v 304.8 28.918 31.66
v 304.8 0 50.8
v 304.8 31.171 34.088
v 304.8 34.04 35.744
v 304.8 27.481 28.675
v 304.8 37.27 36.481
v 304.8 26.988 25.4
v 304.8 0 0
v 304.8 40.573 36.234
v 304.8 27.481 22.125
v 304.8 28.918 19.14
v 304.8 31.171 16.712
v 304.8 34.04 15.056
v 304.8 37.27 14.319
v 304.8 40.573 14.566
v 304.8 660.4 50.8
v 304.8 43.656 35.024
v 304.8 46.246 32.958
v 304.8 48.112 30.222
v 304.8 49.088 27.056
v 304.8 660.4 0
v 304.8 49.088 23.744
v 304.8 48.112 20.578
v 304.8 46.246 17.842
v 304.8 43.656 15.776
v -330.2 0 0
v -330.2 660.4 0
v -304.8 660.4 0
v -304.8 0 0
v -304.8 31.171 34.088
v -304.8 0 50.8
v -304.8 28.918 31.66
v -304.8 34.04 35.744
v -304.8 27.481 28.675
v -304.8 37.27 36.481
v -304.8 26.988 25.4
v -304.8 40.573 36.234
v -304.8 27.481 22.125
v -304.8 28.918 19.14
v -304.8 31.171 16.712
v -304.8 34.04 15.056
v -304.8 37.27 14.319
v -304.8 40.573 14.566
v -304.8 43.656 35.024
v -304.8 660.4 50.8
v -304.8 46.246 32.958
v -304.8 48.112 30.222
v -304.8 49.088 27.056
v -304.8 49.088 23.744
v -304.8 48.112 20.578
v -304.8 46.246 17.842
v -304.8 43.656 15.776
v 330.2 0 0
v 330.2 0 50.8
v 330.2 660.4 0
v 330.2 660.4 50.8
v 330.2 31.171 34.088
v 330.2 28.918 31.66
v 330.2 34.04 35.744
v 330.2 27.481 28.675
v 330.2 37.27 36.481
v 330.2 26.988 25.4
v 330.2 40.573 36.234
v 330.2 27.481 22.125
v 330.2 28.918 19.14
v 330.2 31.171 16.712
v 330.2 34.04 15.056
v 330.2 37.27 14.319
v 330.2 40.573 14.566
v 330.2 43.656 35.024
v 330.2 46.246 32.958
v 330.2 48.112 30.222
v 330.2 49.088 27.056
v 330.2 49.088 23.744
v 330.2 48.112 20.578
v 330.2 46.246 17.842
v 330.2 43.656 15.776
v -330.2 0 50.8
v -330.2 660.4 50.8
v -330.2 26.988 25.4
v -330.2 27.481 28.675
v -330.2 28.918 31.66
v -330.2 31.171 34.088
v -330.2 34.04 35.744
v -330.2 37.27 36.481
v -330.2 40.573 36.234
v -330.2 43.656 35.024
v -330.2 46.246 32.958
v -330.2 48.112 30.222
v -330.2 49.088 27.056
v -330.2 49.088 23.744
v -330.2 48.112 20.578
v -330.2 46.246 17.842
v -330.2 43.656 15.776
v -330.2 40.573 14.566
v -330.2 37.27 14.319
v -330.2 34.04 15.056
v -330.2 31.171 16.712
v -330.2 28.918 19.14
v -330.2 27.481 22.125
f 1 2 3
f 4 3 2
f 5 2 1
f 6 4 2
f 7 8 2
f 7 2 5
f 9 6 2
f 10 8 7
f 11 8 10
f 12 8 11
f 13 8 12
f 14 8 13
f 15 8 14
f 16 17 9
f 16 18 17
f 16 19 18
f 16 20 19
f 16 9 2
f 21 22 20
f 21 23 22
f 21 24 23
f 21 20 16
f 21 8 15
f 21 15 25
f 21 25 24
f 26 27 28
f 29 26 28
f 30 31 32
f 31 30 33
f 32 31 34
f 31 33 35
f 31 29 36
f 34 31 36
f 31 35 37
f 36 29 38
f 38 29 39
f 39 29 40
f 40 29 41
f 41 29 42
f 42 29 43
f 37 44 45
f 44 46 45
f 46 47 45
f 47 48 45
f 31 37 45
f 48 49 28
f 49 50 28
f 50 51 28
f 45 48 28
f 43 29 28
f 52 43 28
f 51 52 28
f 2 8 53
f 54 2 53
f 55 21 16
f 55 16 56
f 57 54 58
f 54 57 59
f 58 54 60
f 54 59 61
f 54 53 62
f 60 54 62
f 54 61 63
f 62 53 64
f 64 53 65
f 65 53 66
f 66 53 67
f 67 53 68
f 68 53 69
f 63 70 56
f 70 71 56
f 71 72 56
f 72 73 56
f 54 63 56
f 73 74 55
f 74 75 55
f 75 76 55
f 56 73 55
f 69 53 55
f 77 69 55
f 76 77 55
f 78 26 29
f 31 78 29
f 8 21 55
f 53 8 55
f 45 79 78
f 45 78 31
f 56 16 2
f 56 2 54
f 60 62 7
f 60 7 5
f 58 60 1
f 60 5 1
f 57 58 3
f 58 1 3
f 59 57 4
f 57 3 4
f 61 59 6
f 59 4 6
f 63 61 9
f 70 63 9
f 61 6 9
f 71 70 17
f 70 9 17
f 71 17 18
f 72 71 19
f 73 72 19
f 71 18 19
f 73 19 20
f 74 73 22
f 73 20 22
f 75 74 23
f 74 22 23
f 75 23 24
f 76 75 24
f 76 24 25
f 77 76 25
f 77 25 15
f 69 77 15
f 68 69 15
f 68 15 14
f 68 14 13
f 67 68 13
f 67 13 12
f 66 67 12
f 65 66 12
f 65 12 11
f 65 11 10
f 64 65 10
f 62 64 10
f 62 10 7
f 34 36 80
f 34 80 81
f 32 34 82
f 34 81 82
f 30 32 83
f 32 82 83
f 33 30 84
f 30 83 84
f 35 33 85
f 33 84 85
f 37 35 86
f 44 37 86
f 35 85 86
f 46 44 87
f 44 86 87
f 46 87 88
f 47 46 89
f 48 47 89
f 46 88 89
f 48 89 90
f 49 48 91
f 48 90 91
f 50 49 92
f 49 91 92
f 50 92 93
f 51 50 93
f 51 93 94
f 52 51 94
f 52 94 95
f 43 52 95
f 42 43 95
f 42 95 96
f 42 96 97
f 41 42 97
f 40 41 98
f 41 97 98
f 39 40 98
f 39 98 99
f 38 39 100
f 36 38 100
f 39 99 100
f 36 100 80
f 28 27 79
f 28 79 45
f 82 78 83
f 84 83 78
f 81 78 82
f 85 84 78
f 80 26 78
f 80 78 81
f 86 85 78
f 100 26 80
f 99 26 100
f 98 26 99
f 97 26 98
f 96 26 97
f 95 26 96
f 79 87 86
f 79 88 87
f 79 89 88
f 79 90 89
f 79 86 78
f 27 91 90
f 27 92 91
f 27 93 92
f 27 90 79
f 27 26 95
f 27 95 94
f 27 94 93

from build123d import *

# Parameters (mm, degrees)
F0_W     = 25.4
F0_H     = 660.4
F1_DEPTH = 50.8
F2_R     = 11.1125
F3_DEPTH = 25.401
F4_R     = 11.1125
F5_DEPTH = 660.401


with BuildPart() as f1:
    # F0 (on Top) → F1 (new body)
    with BuildSketch(Plane.XY):
        with Locations((-317.5, 330.2)):
            Rectangle(F0_W, F0_H)
        with Locations((317.5, 330.2)):
            Rectangle(F0_W, F0_H)
    extrude(amount=F1_DEPTH)

    # F2 (on face) → F3 (cut, through all)
    with BuildSketch(Plane(origin=(304.8, 0, 0), x_dir=(0, -1, 0), z_dir=(-1, 0, 0))):
        with Locations((-38.1, 25.4)):
            Circle(F2_R)
    extrude(amount=-F3_DEPTH, mode=Mode.SUBTRACT)

    # F4 (on face) → F5 (cut, through all)
    with BuildSketch(Plane(origin=(-330.2, 0, 0), x_dir=(0, -1, 0), z_dir=(-1, 0, 0))):
        with Locations((-38.1, 25.4)):
            Circle(F4_R)
    extrude(amount=-F5_DEPTH, mode=Mode.SUBTRACT)


solid = f1.part
